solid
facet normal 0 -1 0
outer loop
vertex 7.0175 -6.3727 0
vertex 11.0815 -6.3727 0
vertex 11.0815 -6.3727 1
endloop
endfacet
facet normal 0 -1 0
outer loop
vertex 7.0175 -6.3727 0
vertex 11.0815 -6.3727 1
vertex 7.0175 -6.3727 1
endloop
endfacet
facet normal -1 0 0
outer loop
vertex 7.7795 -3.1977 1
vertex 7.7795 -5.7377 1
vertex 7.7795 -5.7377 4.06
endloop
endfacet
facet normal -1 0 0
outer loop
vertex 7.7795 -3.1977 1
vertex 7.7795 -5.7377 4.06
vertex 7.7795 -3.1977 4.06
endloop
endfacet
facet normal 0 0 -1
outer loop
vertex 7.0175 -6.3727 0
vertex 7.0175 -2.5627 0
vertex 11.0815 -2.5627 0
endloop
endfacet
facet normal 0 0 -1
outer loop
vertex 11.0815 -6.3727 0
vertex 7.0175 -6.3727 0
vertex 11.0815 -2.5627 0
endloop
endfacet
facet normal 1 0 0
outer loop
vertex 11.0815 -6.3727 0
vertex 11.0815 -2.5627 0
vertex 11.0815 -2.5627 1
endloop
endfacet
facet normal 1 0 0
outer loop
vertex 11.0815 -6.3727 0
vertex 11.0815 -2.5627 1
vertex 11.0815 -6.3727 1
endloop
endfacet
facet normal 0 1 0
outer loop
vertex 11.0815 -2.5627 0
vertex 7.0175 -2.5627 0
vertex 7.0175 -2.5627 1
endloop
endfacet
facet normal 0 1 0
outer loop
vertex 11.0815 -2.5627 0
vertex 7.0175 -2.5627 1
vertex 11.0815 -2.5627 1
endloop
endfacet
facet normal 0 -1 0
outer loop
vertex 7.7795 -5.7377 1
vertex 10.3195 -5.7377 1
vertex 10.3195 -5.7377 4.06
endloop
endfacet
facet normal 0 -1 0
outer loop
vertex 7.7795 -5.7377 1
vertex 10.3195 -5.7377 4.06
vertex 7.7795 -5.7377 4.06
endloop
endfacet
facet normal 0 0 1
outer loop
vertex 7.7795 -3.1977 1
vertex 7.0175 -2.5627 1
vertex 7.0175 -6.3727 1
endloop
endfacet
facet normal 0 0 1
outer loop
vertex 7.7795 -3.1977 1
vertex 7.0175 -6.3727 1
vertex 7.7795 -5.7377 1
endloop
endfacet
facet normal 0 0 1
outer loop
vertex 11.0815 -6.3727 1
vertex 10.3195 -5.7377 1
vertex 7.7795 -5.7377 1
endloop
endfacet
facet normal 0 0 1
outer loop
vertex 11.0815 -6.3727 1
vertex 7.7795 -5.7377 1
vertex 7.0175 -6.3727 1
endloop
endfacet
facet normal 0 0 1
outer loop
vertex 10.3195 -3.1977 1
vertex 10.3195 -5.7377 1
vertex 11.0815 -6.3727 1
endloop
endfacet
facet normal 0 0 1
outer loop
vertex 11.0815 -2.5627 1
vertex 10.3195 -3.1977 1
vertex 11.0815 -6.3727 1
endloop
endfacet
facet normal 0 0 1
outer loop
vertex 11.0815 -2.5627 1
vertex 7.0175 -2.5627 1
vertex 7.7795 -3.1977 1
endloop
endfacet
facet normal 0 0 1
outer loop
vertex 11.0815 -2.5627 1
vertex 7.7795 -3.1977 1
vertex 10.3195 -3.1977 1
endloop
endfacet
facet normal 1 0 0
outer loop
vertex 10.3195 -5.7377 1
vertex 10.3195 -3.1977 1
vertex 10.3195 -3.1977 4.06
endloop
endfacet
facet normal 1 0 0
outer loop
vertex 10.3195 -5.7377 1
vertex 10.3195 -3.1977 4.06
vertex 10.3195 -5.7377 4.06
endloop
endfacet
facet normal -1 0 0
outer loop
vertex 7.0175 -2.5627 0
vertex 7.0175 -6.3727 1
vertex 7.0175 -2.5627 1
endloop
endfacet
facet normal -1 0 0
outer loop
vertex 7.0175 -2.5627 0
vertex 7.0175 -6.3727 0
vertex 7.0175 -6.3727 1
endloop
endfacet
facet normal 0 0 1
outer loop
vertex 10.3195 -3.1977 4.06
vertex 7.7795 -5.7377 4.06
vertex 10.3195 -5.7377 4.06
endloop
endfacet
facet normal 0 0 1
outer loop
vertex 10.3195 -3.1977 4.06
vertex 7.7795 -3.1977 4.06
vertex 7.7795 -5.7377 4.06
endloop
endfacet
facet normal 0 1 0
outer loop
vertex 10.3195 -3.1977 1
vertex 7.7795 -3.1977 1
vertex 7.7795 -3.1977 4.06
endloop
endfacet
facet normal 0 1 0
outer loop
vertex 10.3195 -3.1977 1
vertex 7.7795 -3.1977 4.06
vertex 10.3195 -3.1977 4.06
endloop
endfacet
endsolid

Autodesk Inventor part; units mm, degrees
ref_plane "YZ Plane" through (0, 0, 0) normal (1, 0, 0) x (0, 1, 0)
ref_plane "XZ Plane" through (0, 0, 0) normal (0, 1, 0) x (-1, 0, 0)
ref_plane "XY Plane" through (0, 0, 0) normal (0, 0, 1) x (1, 0, 0)
sketch "Sketch1" plane through (0, 0, 0) normal (0, 0, 1) x (1, 0, 0)
  line L0 (7.0175, -2.5627) -> (11.0815, -2.5627)
  line L1 (11.0815, -2.5627) -> (11.0815, -6.3727)
  line L2 (11.0815, -6.3727) -> (7.0175, -6.3727)
  line L3 (7.0175, -6.3727) -> (7.0175, -2.5627)
  point P0 (0, 0)
  dimension "d0" = 4.064
  dimension "d1" = 3.81
extrude "Extrusion1" add sketch "Sketch1" along normal blind 1
sketch "Sketch2" plane through (0, 0, 1) normal (0, 0, 1) x (1, 0, 0)
  line L0 (11.0815, -2.5627) -> (7.0175, -2.5627) projected
  line L1 (11.0815, -6.3727) -> (11.0815, -2.5627) projected
  line L2 (7.7795, -3.1977) -> (10.3195, -3.1977)
  line L3 (10.3195, -3.1977) -> (10.3195, -5.7377)
  line L4 (10.3195, -5.7377) -> (7.7795, -5.7377)
  line L5 (7.7795, -5.7377) -> (7.7795, -3.1977)
  point P0 (0, 0)
  dimension "d4" = 2.54
  dimension "d5" = 2.54
  dimension "d6" = 0.635
  dimension "d7" = 0.762
extrude "Extrusion2" add sketch "Sketch2" along normal blind 3.06
properties part number "RFSplitter"
